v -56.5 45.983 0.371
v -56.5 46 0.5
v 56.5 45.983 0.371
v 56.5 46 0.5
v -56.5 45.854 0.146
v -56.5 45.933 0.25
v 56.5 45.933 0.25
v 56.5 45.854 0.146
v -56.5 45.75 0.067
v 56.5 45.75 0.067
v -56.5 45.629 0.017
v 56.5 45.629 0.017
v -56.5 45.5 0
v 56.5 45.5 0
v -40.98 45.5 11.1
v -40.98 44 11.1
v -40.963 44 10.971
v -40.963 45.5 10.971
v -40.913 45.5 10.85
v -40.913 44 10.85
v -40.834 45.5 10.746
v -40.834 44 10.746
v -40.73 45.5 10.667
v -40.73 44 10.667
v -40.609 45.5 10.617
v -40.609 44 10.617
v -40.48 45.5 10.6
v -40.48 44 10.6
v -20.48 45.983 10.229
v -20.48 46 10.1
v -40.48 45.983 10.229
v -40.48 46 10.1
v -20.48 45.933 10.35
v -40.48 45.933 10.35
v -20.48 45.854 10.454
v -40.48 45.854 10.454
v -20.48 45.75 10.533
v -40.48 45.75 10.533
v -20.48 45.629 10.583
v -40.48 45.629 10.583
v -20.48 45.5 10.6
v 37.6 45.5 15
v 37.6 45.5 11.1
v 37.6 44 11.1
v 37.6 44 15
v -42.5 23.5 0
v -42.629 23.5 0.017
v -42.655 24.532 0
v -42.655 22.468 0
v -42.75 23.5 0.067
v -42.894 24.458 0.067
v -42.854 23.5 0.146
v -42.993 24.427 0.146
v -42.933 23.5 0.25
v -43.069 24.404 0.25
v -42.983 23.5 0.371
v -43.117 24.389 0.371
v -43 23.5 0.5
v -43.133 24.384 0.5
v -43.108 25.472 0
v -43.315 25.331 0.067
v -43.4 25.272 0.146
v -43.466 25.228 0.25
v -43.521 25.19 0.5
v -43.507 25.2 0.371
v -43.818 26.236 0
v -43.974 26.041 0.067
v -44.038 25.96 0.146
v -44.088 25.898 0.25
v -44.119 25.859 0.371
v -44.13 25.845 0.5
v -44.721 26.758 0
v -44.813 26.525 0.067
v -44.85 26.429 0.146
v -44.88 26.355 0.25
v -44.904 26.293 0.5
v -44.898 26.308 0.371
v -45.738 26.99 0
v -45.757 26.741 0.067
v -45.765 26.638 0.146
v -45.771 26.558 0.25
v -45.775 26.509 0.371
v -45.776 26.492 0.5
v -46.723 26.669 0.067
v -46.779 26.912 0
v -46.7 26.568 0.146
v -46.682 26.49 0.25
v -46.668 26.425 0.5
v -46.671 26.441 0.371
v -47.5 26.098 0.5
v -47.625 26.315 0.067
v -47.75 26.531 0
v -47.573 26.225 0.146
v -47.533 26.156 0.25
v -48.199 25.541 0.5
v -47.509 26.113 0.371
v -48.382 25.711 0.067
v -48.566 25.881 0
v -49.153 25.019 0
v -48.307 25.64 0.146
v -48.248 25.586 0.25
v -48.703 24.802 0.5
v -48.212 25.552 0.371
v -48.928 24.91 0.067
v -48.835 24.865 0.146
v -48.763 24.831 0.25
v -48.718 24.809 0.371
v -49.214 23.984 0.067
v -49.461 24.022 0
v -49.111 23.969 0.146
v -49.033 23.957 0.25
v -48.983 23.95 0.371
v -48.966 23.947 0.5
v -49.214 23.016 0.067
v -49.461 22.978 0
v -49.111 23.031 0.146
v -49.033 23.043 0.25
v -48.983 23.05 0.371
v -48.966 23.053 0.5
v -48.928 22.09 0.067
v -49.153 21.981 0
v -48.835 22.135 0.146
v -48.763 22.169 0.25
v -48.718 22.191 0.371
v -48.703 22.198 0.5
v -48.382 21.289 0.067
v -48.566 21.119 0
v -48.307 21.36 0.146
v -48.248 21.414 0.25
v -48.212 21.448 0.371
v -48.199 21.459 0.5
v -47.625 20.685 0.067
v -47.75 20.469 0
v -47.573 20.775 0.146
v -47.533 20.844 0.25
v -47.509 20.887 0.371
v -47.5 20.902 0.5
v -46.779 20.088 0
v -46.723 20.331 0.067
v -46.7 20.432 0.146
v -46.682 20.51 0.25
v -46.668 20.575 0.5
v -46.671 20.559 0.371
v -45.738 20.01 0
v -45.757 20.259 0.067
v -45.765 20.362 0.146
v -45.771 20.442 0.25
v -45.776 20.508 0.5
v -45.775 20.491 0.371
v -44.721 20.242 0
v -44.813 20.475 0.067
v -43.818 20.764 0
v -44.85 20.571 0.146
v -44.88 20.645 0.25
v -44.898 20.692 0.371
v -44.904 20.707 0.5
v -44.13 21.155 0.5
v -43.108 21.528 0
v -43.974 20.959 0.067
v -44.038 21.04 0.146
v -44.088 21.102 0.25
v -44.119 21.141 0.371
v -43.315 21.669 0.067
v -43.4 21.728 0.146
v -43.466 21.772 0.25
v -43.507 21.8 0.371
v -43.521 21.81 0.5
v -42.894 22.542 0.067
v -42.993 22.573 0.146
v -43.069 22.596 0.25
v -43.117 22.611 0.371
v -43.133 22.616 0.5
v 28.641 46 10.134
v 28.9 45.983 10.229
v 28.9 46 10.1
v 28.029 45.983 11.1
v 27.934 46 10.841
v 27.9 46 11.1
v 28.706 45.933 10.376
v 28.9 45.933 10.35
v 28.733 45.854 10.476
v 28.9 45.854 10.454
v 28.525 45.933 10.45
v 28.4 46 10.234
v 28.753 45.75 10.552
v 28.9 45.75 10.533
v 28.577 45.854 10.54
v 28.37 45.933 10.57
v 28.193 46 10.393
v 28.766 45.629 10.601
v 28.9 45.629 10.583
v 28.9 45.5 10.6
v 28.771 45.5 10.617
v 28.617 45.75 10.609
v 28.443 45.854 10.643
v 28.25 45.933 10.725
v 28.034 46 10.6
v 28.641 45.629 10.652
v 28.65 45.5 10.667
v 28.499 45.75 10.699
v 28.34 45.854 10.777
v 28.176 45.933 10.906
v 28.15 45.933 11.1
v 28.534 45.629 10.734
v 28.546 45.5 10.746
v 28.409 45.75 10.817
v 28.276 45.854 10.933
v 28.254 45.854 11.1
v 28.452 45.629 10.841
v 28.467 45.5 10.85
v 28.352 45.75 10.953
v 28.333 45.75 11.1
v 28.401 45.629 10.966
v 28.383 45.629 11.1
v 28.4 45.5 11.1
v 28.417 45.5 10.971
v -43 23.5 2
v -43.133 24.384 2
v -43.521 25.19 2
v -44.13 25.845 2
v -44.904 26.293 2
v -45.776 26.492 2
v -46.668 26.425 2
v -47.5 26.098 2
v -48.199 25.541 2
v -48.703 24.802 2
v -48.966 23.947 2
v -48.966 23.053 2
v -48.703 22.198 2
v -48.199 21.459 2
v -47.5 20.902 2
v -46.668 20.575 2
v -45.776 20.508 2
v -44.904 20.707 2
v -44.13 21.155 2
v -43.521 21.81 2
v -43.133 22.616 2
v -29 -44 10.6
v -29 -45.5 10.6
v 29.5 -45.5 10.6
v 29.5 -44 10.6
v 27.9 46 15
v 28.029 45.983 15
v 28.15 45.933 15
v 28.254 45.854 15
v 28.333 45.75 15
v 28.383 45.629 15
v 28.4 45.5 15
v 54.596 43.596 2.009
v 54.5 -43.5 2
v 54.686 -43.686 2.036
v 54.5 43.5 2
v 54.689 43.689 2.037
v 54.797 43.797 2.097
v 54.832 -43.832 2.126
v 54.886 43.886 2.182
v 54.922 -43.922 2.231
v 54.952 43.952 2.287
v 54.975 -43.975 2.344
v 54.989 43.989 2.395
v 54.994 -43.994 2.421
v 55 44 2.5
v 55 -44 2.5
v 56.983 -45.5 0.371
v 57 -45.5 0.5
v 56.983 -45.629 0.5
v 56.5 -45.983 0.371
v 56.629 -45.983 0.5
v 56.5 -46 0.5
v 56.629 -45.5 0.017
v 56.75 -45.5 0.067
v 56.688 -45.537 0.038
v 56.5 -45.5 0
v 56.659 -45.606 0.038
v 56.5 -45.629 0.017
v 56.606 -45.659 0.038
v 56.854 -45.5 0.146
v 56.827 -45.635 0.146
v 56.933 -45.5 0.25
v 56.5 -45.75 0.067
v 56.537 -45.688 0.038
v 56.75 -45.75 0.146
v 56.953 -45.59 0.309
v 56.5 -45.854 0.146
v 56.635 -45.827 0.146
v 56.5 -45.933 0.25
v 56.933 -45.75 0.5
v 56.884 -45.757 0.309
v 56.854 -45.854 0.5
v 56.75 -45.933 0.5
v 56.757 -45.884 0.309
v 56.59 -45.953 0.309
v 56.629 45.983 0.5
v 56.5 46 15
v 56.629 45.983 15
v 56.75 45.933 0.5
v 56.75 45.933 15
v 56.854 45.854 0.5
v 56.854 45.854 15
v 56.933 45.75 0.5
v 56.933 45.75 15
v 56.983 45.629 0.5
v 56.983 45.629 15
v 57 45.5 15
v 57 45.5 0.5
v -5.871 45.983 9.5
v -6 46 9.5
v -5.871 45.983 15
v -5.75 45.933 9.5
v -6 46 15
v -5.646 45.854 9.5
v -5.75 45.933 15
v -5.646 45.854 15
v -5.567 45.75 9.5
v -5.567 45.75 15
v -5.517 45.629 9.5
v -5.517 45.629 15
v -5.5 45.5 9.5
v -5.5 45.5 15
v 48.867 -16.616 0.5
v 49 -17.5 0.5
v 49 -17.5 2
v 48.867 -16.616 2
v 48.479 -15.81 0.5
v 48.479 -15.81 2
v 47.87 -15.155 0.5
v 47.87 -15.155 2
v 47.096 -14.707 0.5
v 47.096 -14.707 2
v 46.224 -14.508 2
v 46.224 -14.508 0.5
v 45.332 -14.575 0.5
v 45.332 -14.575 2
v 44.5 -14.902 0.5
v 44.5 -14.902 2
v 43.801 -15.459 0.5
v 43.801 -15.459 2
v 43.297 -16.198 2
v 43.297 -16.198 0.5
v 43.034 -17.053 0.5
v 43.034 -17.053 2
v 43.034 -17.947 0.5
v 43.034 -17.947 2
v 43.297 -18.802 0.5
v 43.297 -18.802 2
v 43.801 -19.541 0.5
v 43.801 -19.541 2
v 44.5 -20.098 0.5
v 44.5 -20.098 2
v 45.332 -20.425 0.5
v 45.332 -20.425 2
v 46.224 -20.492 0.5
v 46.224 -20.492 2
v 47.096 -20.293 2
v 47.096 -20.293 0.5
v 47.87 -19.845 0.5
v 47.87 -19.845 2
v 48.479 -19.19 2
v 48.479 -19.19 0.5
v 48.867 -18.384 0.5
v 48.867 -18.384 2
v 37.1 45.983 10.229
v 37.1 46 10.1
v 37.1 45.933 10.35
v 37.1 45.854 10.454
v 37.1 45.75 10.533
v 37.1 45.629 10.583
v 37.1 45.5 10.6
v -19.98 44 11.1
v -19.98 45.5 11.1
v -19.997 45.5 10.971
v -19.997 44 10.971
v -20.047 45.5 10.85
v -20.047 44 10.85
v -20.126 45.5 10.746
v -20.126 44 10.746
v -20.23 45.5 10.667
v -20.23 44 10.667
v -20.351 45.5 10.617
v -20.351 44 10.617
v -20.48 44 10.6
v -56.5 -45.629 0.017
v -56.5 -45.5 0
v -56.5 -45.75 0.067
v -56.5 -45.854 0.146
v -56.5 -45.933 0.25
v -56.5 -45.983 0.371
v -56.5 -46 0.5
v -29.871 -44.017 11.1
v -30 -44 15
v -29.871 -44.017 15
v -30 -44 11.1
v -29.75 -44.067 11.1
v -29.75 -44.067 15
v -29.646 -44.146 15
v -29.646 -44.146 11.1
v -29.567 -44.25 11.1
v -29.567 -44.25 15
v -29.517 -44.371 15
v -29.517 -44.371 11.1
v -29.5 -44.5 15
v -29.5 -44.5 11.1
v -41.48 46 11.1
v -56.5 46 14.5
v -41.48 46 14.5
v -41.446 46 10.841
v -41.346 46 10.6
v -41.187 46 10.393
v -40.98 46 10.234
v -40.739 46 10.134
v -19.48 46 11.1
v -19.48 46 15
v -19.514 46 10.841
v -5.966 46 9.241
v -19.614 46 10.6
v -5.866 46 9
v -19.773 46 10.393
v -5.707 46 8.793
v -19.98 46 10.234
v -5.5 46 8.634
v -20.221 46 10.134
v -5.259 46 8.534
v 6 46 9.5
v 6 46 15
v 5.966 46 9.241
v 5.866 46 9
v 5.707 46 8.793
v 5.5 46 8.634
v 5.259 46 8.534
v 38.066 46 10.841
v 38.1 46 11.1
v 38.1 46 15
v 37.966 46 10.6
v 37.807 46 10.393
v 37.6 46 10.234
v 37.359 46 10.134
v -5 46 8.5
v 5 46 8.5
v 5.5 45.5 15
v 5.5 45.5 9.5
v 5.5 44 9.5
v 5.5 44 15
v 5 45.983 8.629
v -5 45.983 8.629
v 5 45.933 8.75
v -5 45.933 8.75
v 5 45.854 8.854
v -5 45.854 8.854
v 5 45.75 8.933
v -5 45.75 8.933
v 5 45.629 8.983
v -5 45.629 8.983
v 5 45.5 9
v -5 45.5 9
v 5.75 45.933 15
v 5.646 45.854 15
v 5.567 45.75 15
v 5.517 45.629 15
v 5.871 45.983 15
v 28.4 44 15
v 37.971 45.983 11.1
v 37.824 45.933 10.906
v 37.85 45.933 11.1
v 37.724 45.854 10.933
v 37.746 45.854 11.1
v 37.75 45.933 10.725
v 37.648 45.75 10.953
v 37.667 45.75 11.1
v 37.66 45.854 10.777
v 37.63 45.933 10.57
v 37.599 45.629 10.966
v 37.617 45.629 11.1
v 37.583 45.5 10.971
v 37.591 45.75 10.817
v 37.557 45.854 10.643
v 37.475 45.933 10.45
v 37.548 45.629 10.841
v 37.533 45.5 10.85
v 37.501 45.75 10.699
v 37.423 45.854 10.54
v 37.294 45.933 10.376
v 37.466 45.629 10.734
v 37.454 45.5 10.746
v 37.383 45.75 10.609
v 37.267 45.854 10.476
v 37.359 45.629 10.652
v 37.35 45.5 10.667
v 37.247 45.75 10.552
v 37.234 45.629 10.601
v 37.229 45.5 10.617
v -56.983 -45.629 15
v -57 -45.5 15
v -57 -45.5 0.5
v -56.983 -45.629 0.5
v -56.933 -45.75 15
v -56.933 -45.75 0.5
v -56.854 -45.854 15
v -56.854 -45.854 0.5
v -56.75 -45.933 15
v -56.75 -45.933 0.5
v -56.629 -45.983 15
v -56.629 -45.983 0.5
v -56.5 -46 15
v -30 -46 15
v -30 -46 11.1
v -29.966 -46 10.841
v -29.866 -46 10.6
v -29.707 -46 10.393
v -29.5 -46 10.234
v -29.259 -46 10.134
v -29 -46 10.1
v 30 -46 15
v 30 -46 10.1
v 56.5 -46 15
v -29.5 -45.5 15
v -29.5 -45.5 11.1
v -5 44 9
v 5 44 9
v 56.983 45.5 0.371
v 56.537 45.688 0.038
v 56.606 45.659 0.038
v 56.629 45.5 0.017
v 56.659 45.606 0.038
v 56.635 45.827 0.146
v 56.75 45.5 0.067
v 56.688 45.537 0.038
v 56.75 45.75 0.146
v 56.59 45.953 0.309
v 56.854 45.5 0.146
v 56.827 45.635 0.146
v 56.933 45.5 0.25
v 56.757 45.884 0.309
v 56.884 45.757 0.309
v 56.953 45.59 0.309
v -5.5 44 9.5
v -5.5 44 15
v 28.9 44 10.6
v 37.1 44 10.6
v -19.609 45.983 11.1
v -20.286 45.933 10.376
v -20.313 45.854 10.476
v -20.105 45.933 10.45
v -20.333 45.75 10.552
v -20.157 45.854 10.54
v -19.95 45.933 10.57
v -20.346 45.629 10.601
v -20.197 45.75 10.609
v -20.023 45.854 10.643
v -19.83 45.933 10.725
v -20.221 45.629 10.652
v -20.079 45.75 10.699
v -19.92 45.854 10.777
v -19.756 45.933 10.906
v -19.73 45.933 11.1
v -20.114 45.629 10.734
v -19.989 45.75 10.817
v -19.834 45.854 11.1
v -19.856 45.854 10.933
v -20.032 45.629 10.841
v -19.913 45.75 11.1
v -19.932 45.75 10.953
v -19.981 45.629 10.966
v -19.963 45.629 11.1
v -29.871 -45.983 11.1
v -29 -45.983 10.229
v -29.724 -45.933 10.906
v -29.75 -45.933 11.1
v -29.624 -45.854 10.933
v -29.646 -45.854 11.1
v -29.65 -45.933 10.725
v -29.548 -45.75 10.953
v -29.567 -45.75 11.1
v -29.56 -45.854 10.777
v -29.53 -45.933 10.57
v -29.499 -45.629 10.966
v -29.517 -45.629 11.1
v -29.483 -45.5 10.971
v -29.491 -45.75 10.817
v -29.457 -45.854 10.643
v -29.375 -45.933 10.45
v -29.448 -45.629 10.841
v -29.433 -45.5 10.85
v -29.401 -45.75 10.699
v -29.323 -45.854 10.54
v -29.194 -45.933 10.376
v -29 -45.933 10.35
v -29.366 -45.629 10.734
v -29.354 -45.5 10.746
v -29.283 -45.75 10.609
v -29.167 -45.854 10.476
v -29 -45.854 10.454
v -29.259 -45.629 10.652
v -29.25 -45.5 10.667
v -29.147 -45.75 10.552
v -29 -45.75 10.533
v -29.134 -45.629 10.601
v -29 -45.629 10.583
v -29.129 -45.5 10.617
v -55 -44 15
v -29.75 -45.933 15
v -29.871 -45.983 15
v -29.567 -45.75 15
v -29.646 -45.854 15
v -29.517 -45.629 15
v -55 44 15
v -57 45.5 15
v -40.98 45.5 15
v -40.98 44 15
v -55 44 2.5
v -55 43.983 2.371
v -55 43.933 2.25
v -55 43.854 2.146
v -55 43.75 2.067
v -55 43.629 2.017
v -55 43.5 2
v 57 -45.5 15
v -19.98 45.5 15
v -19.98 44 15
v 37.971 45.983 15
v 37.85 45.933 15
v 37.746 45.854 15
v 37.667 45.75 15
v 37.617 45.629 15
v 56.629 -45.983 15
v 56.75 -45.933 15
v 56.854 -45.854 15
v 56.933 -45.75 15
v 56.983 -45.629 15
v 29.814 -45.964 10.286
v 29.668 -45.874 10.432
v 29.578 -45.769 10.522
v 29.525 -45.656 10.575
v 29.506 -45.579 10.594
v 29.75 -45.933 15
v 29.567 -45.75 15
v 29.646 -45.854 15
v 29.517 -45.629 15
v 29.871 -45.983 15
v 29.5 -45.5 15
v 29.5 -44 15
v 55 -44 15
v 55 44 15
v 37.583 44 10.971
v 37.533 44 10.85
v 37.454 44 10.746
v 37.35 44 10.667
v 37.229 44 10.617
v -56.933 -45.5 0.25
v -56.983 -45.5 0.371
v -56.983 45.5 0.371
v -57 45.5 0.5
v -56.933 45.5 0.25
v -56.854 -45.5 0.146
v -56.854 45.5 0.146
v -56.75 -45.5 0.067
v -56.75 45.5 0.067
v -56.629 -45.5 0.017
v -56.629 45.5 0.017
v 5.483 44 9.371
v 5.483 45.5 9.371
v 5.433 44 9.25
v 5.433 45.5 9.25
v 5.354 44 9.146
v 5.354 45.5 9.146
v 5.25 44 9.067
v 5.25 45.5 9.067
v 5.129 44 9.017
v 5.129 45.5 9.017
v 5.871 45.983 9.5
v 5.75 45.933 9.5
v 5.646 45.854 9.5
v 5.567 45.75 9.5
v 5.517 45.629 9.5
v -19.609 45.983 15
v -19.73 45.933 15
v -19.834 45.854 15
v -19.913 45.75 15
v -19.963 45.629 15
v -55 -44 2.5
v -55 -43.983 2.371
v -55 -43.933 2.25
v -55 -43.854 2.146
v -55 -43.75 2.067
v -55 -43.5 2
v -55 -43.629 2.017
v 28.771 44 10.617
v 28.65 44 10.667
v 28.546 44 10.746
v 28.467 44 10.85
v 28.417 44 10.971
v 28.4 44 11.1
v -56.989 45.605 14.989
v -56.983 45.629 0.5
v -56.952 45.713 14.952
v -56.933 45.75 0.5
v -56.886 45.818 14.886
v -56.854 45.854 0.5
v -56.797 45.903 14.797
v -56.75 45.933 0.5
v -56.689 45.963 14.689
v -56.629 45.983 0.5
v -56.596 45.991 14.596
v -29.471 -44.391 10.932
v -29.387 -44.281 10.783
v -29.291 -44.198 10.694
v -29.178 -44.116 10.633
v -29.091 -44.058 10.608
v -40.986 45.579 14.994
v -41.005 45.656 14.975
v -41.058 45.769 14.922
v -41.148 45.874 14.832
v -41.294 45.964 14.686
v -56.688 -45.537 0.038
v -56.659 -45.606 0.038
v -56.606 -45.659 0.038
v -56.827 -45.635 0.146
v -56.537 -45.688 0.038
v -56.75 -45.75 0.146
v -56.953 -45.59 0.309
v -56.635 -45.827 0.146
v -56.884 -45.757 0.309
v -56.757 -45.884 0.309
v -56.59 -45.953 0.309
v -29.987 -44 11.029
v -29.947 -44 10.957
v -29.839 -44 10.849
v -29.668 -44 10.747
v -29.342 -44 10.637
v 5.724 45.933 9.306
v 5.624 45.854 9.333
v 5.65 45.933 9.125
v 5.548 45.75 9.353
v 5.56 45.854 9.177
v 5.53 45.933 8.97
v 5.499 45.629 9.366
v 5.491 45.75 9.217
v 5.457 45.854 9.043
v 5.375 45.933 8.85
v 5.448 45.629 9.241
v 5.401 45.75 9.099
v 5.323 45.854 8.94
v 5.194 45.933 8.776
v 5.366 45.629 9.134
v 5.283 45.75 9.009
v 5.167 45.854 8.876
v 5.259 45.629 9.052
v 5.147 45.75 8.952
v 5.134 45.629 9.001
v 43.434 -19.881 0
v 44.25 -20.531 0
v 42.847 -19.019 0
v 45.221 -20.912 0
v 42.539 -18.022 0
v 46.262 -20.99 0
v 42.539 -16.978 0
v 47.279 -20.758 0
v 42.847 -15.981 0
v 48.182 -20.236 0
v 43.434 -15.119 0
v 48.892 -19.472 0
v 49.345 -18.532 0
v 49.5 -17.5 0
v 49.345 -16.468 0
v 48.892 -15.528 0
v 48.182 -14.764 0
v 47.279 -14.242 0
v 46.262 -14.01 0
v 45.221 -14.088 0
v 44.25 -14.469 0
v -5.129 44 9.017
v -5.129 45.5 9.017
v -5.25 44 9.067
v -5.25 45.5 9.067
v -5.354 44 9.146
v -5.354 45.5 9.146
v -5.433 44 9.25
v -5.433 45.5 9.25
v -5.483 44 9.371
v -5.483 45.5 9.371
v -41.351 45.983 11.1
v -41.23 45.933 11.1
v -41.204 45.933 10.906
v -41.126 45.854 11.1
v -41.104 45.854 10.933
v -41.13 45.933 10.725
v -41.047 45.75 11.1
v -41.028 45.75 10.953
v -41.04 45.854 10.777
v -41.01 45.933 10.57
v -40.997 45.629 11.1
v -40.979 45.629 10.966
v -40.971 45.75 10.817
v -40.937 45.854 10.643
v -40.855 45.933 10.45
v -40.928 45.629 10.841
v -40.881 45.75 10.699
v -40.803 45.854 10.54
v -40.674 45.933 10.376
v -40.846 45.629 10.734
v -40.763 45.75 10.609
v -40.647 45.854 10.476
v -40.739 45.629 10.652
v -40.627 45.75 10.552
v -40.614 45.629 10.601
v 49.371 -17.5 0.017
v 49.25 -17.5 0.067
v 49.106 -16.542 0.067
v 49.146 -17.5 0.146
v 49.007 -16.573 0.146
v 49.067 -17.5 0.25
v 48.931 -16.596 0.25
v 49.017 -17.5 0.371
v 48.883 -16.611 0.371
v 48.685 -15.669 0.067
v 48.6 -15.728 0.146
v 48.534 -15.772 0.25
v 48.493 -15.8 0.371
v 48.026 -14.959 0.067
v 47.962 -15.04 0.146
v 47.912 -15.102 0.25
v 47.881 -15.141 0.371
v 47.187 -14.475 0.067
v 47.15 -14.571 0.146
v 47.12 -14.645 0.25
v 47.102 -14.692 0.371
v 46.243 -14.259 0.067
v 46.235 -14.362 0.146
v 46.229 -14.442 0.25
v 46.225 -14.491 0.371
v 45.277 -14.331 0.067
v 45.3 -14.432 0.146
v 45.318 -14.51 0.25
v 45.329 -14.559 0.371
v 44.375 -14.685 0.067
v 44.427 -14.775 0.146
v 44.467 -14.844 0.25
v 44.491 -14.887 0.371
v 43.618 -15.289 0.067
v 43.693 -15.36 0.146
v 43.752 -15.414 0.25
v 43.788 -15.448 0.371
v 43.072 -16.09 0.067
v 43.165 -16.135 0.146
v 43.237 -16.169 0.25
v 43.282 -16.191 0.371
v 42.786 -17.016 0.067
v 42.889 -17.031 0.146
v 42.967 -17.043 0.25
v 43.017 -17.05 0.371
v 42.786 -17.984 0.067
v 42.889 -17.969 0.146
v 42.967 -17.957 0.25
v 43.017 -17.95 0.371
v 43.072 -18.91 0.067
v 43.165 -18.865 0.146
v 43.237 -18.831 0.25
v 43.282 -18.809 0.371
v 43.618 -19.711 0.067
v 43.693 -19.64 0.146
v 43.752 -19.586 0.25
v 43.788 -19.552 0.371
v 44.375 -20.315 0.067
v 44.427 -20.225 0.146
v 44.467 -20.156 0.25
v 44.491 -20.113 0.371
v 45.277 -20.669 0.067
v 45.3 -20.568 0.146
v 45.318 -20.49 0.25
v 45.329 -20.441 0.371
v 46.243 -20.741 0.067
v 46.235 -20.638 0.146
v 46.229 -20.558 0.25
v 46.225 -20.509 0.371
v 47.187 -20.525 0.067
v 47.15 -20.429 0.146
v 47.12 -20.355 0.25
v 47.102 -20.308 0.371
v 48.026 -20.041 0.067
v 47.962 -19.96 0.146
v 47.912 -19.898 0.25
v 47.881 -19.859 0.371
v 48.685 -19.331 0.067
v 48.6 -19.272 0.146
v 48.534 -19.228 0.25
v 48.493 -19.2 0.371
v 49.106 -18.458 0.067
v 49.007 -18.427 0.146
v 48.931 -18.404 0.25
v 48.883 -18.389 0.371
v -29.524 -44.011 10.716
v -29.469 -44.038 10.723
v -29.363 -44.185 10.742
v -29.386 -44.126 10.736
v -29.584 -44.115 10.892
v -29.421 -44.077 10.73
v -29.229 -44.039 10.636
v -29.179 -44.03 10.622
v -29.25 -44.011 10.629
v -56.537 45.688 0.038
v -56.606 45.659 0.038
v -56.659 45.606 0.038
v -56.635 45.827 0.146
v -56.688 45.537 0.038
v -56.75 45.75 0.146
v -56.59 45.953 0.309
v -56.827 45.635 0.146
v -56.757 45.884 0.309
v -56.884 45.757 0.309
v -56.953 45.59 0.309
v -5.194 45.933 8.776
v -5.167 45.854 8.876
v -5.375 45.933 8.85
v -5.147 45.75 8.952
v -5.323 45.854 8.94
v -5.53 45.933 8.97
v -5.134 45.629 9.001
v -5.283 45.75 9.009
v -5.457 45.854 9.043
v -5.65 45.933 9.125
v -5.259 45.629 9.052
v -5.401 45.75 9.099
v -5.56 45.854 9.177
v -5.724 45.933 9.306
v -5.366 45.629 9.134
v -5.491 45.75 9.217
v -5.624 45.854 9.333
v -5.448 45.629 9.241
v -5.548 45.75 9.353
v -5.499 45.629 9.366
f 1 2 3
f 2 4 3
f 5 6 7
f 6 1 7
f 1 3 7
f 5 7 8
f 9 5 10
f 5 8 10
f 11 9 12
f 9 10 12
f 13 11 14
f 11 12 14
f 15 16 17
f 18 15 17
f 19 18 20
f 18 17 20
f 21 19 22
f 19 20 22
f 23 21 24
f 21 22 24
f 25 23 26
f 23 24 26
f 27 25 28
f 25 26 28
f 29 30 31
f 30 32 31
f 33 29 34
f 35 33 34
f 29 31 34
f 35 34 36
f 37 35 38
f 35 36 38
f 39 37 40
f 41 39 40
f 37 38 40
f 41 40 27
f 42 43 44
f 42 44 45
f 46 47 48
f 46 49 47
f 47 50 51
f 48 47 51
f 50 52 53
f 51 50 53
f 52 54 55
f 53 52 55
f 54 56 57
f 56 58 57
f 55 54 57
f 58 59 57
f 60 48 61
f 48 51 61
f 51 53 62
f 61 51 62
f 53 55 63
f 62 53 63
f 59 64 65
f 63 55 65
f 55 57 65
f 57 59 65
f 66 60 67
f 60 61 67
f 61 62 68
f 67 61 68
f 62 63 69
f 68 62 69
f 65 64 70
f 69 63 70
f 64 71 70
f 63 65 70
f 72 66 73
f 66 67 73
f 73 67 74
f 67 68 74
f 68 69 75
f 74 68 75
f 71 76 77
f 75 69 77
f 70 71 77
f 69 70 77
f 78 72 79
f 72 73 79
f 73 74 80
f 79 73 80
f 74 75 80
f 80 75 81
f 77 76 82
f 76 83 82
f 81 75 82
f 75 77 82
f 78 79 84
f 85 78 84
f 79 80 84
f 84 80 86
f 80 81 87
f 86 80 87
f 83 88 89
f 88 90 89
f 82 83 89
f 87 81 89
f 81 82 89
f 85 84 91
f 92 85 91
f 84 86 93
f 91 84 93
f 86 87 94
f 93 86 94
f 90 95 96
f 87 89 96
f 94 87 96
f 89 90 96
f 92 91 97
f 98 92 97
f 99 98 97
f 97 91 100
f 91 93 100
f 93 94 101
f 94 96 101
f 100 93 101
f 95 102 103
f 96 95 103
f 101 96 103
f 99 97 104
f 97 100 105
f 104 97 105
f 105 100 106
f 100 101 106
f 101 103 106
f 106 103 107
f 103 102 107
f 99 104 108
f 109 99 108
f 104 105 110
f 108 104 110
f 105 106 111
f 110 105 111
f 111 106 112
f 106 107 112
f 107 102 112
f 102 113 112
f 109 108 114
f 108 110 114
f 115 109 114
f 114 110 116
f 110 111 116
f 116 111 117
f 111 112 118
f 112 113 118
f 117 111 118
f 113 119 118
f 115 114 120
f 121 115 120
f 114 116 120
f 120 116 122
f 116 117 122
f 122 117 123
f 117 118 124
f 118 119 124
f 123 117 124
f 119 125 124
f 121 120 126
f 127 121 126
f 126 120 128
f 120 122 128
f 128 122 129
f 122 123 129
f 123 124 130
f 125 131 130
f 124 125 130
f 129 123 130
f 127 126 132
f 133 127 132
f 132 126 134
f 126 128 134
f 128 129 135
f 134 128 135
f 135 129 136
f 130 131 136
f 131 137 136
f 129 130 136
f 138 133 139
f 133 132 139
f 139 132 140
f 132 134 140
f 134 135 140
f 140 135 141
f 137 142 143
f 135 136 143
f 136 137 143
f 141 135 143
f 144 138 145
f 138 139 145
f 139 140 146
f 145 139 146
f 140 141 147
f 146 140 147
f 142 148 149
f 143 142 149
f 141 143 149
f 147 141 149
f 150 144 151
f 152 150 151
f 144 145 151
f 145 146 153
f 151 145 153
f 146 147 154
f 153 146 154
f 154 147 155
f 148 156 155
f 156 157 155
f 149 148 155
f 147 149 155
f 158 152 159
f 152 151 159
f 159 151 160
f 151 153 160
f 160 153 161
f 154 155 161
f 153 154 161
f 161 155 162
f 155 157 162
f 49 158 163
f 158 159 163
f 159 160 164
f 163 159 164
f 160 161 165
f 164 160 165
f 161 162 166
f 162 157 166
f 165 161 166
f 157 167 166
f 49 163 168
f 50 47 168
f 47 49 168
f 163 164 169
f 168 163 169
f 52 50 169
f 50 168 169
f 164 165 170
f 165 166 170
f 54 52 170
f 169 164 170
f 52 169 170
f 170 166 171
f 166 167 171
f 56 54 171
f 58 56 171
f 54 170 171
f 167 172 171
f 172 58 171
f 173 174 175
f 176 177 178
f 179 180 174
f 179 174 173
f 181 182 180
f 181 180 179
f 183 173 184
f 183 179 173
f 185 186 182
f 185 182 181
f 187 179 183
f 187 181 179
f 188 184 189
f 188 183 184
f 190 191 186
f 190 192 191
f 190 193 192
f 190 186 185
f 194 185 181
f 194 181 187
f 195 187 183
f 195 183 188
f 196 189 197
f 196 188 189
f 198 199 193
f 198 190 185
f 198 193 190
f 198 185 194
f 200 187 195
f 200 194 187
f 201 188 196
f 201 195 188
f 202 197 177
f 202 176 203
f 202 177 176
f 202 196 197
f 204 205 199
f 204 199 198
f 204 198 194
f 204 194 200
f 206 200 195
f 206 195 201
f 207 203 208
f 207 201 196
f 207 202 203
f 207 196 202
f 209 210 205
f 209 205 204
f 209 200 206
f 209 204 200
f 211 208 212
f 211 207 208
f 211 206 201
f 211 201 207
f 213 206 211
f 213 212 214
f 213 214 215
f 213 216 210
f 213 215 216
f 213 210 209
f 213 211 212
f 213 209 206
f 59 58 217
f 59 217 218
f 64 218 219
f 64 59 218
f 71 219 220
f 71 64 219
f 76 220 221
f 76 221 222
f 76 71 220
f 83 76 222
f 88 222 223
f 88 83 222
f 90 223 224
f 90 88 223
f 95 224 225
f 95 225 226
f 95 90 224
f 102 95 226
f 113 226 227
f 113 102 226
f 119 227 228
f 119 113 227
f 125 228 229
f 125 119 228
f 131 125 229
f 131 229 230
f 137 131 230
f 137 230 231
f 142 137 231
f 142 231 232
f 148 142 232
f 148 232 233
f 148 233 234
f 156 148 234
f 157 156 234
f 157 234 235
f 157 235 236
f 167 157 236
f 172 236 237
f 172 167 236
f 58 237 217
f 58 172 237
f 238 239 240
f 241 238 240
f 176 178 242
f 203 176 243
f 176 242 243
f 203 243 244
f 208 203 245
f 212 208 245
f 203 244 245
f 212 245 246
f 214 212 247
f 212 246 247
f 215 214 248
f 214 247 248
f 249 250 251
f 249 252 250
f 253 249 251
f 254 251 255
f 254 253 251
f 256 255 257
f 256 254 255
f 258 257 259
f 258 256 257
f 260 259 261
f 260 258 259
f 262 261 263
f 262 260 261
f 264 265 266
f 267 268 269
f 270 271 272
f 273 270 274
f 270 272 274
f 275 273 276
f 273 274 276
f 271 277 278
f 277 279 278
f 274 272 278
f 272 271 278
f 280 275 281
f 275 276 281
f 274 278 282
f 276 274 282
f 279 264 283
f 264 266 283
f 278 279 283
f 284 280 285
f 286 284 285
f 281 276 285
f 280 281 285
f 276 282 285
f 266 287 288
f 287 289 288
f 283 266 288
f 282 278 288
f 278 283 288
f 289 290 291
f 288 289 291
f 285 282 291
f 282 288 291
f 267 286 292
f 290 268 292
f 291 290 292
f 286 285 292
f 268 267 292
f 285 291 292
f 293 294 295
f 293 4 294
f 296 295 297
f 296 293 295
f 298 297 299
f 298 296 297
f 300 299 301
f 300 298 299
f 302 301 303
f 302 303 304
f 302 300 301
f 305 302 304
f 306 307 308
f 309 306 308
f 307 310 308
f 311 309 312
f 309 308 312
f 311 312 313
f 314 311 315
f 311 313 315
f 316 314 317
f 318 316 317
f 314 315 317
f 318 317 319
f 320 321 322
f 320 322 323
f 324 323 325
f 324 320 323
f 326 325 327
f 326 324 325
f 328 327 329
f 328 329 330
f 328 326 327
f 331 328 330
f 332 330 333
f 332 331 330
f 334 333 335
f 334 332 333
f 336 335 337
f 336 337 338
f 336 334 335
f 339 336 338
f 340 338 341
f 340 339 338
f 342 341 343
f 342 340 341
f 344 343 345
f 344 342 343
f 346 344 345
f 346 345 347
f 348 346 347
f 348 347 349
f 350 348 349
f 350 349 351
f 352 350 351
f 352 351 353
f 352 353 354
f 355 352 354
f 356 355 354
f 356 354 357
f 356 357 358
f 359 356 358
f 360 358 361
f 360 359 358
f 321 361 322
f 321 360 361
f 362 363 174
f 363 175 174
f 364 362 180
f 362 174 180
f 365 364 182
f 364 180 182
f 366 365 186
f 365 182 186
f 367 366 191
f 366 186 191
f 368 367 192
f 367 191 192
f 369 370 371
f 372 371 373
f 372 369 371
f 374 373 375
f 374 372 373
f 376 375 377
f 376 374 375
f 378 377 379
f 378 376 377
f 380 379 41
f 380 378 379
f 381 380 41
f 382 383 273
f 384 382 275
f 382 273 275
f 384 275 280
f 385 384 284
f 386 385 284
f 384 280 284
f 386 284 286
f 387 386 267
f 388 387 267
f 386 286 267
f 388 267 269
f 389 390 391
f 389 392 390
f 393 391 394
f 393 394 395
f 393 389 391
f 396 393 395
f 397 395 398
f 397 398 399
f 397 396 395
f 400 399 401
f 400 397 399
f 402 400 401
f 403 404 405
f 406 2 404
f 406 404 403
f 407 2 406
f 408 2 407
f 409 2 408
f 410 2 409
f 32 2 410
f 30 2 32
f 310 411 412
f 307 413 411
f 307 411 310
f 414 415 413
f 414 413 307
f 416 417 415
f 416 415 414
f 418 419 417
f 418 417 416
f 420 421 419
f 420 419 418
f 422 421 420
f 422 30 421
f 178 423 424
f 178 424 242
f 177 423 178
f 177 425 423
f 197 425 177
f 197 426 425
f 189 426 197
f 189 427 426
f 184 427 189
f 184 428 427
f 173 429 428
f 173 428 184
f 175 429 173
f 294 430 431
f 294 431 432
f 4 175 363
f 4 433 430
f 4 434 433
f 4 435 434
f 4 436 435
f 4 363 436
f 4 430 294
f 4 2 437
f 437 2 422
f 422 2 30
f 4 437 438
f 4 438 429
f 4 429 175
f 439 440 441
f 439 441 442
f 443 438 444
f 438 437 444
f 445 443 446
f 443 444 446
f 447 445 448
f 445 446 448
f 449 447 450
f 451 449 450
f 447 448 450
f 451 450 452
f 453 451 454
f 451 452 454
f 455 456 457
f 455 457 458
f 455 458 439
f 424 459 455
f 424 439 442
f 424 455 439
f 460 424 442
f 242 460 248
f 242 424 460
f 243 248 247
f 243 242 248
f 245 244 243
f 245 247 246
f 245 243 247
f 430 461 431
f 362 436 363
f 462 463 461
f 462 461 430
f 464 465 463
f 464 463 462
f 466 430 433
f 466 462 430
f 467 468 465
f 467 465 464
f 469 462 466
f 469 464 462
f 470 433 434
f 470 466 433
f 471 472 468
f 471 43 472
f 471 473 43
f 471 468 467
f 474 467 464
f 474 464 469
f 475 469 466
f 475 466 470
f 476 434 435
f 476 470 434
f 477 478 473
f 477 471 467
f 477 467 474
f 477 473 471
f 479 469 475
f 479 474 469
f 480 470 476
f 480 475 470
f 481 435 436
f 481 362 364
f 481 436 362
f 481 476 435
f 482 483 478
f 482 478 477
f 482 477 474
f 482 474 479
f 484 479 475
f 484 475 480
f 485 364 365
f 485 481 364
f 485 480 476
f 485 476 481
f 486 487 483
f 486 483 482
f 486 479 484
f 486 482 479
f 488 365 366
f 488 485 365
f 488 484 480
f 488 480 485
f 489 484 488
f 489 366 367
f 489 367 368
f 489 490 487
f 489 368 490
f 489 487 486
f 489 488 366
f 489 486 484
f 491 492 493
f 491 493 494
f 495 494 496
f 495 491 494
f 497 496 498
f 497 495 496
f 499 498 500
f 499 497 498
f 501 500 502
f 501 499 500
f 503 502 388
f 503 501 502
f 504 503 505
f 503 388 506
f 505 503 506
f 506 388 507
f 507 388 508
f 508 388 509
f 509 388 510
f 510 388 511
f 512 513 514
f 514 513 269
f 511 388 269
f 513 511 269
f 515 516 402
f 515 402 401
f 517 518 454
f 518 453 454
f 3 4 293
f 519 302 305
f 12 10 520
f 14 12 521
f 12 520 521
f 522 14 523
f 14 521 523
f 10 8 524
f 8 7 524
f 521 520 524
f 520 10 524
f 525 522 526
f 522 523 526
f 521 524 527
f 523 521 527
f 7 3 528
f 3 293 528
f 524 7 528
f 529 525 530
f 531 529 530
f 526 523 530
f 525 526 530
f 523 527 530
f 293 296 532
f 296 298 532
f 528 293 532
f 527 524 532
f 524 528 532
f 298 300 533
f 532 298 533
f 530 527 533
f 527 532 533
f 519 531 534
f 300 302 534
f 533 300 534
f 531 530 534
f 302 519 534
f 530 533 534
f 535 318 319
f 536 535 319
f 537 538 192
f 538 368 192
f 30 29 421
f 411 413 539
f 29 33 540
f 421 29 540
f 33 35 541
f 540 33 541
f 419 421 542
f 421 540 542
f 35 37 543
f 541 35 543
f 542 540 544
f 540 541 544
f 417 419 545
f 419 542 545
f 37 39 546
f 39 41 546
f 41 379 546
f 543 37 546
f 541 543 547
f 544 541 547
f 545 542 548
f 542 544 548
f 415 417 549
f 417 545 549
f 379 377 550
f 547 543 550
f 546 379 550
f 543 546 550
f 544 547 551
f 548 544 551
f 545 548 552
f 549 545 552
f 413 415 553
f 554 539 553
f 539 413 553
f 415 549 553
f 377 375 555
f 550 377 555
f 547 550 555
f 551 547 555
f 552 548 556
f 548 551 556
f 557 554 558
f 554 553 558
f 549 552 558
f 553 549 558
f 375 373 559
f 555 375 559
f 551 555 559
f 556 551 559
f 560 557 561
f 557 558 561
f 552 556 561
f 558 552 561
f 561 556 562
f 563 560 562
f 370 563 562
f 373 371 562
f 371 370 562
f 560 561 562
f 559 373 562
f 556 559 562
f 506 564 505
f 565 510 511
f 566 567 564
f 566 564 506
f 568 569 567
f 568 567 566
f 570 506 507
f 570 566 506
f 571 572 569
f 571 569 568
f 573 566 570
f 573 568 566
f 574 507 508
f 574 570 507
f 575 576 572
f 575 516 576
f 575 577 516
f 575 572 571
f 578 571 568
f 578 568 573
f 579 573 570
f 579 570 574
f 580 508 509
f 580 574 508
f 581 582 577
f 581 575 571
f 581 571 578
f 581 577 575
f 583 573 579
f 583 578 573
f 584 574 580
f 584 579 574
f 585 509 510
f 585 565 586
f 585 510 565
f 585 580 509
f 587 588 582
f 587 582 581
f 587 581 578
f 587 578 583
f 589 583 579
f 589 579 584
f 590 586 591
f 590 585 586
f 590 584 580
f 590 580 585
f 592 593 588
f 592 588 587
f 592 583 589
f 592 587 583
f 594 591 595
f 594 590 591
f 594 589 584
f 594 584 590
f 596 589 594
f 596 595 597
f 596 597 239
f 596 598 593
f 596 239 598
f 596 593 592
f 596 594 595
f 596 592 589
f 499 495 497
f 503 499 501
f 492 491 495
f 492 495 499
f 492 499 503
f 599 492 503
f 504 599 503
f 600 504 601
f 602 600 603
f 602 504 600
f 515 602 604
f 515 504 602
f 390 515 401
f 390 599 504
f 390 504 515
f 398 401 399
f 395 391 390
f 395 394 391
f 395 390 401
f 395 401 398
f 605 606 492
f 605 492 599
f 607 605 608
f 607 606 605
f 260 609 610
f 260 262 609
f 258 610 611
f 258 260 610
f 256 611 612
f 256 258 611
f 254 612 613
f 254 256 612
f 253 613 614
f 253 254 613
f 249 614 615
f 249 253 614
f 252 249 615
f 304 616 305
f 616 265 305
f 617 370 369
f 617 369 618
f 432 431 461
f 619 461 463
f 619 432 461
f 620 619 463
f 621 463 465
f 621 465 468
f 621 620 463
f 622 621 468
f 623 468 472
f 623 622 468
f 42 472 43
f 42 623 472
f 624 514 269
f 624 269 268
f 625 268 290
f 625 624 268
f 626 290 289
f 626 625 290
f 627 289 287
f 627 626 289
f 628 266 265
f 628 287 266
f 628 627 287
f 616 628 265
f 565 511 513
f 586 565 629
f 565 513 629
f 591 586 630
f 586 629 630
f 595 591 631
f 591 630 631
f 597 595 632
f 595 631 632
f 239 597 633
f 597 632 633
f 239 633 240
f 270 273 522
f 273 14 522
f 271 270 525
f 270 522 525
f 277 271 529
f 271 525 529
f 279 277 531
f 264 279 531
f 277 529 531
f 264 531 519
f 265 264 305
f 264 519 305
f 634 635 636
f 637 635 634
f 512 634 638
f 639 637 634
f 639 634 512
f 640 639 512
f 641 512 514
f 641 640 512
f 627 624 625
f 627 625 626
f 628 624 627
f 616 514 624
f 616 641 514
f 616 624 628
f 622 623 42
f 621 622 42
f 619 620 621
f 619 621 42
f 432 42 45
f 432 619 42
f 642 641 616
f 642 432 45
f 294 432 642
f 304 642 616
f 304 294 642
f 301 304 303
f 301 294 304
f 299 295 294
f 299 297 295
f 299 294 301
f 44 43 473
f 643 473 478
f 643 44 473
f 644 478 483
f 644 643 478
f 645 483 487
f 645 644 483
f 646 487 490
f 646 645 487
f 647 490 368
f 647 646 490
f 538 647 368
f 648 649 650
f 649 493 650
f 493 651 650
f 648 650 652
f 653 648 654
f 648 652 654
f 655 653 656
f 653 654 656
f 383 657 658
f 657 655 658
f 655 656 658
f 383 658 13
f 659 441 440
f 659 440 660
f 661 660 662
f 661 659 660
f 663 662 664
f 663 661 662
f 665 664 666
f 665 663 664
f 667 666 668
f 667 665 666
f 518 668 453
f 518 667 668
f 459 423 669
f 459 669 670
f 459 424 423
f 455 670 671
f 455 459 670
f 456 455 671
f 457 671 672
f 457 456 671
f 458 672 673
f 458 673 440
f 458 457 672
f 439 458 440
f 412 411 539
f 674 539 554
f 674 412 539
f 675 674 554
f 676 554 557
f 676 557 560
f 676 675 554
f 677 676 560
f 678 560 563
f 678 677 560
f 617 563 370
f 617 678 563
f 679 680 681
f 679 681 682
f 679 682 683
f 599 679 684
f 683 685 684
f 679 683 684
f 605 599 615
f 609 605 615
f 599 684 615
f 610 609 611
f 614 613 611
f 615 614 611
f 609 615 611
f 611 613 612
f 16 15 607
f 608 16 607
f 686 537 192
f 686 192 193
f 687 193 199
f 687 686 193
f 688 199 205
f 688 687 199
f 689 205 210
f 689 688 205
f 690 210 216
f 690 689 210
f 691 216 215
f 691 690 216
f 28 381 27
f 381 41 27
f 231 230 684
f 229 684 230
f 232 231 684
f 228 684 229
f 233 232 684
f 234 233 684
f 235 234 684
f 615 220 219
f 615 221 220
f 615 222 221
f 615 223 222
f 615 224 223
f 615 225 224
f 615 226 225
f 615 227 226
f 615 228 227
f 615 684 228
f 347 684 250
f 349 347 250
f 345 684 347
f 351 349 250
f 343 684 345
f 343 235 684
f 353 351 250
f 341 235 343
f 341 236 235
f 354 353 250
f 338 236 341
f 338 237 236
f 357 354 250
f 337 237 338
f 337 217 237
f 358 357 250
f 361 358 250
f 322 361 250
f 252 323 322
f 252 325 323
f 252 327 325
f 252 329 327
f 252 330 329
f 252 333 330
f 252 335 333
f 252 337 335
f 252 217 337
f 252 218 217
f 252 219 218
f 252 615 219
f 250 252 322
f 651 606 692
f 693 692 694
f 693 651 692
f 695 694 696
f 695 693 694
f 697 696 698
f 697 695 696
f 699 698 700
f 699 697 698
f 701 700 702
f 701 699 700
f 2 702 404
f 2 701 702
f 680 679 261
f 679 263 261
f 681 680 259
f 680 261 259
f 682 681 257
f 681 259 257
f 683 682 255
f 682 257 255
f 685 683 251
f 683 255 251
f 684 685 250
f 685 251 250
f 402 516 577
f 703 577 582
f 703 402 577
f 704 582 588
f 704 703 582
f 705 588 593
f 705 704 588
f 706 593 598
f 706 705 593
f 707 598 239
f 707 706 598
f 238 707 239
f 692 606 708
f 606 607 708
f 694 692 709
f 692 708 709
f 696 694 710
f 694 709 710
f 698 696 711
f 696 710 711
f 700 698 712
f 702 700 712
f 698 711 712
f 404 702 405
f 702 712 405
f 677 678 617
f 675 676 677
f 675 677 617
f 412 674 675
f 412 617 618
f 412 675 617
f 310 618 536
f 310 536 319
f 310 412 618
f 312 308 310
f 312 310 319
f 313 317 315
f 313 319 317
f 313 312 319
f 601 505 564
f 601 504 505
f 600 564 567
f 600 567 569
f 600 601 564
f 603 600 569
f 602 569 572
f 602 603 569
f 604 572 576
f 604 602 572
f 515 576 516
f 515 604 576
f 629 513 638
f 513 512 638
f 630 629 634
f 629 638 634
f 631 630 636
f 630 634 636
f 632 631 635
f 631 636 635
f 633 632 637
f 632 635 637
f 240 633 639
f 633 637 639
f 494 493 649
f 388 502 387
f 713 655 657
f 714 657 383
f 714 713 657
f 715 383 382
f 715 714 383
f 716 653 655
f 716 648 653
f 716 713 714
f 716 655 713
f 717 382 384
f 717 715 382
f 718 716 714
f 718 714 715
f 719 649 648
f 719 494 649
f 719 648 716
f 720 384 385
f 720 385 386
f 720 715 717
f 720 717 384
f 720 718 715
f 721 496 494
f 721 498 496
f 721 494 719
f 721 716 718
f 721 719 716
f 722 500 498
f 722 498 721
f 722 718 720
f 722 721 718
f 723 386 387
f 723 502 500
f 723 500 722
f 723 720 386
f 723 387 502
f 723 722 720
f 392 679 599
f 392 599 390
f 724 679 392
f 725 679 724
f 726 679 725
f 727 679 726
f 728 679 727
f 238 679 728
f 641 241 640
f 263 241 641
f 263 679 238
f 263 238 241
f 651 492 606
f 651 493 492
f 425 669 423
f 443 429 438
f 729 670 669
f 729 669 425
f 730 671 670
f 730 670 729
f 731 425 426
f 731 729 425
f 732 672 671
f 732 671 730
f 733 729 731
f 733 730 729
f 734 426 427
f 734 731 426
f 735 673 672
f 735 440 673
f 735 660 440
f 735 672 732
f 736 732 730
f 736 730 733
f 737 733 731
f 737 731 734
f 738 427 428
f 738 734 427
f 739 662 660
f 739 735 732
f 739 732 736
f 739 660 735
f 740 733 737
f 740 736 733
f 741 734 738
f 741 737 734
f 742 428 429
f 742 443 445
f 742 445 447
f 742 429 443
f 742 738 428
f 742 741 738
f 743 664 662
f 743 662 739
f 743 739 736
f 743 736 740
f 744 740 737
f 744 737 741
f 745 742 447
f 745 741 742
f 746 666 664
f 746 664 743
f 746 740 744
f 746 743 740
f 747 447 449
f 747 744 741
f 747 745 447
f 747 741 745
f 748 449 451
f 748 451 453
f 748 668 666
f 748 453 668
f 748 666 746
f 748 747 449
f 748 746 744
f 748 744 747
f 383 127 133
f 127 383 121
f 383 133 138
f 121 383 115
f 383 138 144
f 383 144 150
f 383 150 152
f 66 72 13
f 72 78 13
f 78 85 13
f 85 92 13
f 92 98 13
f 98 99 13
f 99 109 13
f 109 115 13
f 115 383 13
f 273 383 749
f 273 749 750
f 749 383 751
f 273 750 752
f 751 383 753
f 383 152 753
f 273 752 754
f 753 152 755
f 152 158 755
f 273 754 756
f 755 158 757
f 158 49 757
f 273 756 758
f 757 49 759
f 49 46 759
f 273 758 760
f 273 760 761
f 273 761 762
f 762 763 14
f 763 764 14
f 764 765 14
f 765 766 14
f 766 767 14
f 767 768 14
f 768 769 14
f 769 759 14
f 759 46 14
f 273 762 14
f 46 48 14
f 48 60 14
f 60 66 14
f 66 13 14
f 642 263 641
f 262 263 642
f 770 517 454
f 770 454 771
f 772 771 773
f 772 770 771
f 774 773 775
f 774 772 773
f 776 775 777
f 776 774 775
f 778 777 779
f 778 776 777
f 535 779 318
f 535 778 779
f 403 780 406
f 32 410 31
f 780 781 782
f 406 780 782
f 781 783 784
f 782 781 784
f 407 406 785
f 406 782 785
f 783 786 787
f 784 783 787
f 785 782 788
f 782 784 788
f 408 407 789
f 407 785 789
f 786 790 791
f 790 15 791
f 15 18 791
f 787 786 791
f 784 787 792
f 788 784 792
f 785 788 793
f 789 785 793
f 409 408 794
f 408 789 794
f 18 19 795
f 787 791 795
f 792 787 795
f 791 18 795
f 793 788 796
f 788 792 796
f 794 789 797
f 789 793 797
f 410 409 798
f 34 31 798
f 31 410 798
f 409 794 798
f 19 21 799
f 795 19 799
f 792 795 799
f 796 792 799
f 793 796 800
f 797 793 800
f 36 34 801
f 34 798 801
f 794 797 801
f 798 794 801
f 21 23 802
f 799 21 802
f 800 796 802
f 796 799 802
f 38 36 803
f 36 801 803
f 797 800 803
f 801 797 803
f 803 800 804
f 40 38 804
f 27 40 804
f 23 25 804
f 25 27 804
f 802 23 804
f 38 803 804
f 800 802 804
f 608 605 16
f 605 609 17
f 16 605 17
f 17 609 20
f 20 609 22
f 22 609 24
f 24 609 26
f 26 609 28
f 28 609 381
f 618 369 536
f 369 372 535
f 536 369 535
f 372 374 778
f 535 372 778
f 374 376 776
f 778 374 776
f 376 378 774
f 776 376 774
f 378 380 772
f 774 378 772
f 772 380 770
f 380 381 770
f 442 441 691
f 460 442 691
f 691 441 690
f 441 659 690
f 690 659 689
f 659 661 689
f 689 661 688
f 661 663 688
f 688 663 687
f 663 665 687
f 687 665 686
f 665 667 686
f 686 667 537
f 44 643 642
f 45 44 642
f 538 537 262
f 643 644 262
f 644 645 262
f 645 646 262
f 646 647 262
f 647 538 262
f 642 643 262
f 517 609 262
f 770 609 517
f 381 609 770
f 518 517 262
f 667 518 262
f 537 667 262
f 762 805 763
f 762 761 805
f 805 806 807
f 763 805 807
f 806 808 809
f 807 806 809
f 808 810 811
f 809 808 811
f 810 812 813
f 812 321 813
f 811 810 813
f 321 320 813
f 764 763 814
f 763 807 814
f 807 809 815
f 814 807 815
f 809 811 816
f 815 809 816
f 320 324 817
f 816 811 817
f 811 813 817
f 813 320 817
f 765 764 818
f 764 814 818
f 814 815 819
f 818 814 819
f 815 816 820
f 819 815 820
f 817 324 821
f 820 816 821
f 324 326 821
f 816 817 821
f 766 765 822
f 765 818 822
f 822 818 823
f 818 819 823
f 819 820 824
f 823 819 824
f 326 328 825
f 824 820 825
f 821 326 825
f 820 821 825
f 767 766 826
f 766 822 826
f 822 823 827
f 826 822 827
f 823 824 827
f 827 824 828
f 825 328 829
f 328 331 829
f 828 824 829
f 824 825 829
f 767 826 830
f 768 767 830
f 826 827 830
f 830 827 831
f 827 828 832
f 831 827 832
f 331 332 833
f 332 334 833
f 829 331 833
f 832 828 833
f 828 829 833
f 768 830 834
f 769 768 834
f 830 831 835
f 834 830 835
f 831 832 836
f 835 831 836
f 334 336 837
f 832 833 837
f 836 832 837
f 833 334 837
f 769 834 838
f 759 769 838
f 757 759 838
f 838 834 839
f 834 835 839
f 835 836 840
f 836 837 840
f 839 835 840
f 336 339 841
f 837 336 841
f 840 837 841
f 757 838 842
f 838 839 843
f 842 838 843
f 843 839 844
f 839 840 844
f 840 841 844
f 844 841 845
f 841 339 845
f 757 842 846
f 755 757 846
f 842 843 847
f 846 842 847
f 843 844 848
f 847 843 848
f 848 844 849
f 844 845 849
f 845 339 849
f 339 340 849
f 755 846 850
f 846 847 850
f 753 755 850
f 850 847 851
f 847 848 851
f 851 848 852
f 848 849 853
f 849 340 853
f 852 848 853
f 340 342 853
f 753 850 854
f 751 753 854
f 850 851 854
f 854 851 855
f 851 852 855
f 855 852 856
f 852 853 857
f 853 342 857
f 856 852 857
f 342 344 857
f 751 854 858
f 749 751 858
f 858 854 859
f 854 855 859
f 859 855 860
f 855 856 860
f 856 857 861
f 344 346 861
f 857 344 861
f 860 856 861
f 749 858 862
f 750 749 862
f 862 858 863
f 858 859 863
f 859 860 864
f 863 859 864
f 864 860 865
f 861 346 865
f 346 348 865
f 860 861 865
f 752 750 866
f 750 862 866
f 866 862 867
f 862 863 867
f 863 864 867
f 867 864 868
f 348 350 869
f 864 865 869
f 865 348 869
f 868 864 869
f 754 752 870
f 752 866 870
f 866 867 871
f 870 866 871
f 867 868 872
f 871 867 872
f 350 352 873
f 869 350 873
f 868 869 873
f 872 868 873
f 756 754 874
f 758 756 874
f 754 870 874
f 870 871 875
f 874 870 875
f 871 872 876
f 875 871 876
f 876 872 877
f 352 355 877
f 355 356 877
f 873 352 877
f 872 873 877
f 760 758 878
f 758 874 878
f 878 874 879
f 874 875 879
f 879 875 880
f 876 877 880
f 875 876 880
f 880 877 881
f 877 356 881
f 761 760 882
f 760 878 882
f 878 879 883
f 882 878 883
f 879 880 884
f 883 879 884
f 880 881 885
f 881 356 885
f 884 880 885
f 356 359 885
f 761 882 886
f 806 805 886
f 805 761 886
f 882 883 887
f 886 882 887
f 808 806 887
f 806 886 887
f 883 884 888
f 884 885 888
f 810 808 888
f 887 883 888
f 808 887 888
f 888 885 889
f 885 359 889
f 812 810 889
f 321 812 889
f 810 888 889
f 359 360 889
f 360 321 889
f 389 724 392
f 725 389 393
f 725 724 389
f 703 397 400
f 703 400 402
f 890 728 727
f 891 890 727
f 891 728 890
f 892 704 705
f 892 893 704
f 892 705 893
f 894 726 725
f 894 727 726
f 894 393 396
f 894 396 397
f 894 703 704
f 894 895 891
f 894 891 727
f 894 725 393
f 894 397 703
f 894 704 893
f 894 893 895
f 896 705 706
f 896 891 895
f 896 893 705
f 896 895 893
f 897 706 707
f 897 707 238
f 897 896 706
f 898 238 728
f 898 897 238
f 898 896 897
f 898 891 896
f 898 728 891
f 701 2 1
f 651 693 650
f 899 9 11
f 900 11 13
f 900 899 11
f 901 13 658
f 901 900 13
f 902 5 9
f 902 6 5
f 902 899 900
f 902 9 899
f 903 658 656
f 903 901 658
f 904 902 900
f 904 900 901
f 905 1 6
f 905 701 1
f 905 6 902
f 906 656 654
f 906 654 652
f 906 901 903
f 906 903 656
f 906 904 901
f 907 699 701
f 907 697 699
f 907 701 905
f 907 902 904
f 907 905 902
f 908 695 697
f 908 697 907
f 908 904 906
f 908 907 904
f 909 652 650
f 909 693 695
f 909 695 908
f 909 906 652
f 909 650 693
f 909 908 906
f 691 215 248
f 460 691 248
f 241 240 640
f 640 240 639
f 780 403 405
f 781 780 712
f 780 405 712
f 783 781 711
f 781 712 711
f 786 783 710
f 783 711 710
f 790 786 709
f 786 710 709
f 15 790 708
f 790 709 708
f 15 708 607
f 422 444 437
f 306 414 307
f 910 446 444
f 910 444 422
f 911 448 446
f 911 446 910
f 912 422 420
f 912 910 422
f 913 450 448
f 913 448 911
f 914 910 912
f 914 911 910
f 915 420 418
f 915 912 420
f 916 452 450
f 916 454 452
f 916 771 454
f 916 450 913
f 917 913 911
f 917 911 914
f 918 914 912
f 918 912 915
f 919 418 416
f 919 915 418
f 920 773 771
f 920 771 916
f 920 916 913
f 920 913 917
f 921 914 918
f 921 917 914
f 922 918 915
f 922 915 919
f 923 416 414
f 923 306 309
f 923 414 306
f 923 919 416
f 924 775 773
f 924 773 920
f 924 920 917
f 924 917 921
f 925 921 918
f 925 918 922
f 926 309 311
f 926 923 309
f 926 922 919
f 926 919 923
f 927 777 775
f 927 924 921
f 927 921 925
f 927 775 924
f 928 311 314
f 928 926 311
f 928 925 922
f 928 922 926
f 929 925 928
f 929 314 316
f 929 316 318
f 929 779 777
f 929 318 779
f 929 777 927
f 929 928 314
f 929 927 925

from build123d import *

# Parameters (mm, degrees)
SKETCH_W        = 114
SKETCH_H        = 92
SKETCH_R        = 3
PAD_DEPTH       = 2
SKETCH001_W     = 114
SKETCH001_H     = 92
SKETCH001_W_2   = 110
SKETCH001_H_2   = 88
PAD001_DEPTH    = 13
SKETCH003_W     = 59
SKETCH003_H     = 10
POCKET_DEPTH    = 5
SKETCH004_W     = 11
SKETCH004_H     = 6.2
POCKET001_DEPTH = 5
SKETCH005_W     = 21
SKETCH005_H     = 21
POCKET002_DEPTH = 5
SKETCH006_W     = 9.2
SKETCH006_H     = 11
POCKET003_DEPTH = 5
FILLET_R        = 0.5


with BuildPart() as part:
    # Sketch → Pad (new body)
    with BuildSketch(Plane.XY):
        Rectangle(SKETCH_W, SKETCH_H)
        with Locations((-46, 23.5)):
            Circle(SKETCH_R, mode=Mode.SUBTRACT)
        with Locations((46, -17.5)):
            Circle(SKETCH_R, mode=Mode.SUBTRACT)
    extrude(amount=PAD_DEPTH)

    # Sketch001 (on Face8 of Pad) → Pad001 (join)
    with BuildSketch(Plane.XY.offset(2)):
        Rectangle(SKETCH001_W, SKETCH001_H)
        Rectangle(SKETCH001_W_2, SKETCH001_H_2, mode=Mode.SUBTRACT)
    extrude(amount=PAD001_DEPTH)

    # Sketch003 (on Face12 of Pad001) → Pocket (cut)
    with BuildSketch(Plane.XZ.offset(46)):
        with Locations((0, 15.6)):
            Rectangle(SKETCH003_W, SKETCH003_H)
    extrude(amount=-POCKET_DEPTH, mode=Mode.SUBTRACT)

    # Sketch004 (on Face5 of Pocket) → Pocket001 (cut)
    with BuildSketch(Plane(origin=(0, 46, 0), x_dir=(-1, 0, 0), z_dir=(0, 1, 0))):
        with Locations((0, 12.1)):
            Rectangle(SKETCH004_W, SKETCH004_H)
    extrude(amount=-POCKET001_DEPTH, mode=Mode.SUBTRACT)

    # Sketch005 (on Face5 of Pocket001) → Pocket002 (cut)
    with BuildSketch(Plane(origin=(0, 46, 0), x_dir=(-1, 0, 0), z_dir=(0, 1, 0))):
        with Locations((30.48, 21.1)):
            Rectangle(SKETCH005_W, SKETCH005_H)
    extrude(amount=-POCKET002_DEPTH, mode=Mode.SUBTRACT)

    # Sketch006 (on Face5 of Pocket002) → Pocket003 (cut)
    with BuildSketch(Plane(origin=(0, 46, 0), x_dir=(-1, 0, 0), z_dir=(0, 1, 0))):
        with Locations((-33, 16.1)):
            Rectangle(SKETCH006_W, SKETCH006_H)
    extrude(amount=-POCKET003_DEPTH, mode=Mode.SUBTRACT)

    # Fillet
    fillet_edges = [part.edges().sort_by_distance(p)[0] for p in [
        (-57, 46, 1),
        (57, 46, 1),
        (0, 46, 0),
        (-57, -46, 1),
        (-57, 0, 0),
        (57, -46, 1),
        (57, 0, 0),
        (0, -46, 0),
        (43, -17.5, 0),
        (-49, 23.5, 0),
        (57, 46, 8.5),
        (37.6, 46, 12.8),
        (33, 46, 10.6),
        (28.4, 46, 12.8),
        (5.5, 46, 12),
        (0, 46, 9),
        (-5.5, 46, 12),
        (-19.98, 46, 12.8),
        (-40.98, 46, 12.8),
        (-48.99, 46, 15),
        (-57, 46, 8.5),
        (37.6, 45, 10.6),
        (28.4, 45, 10.6),
        (5.5, 45, 9),
        (-19.98, 45, 10.6),
        (-30.48, 46, 10.6),
        (-40.98, 45, 10.6),
        (57, -46, 8.5),
        (-57, -46, 8.5),
        (0, -46, 10.6),
        (29.5, -46, 12.8),
        (-29.5, -45, 10.6),
        (-29.5, -46, 12.8),
        (-29.5, -44, 12.8),
        (0, 44, 2),
        (55, 0, 2),
        (0, -44, 2),
        (-5.5, 45, 9),
    ]]
    fillet(fillet_edges, radius=FILLET_R)


solid = part.part
